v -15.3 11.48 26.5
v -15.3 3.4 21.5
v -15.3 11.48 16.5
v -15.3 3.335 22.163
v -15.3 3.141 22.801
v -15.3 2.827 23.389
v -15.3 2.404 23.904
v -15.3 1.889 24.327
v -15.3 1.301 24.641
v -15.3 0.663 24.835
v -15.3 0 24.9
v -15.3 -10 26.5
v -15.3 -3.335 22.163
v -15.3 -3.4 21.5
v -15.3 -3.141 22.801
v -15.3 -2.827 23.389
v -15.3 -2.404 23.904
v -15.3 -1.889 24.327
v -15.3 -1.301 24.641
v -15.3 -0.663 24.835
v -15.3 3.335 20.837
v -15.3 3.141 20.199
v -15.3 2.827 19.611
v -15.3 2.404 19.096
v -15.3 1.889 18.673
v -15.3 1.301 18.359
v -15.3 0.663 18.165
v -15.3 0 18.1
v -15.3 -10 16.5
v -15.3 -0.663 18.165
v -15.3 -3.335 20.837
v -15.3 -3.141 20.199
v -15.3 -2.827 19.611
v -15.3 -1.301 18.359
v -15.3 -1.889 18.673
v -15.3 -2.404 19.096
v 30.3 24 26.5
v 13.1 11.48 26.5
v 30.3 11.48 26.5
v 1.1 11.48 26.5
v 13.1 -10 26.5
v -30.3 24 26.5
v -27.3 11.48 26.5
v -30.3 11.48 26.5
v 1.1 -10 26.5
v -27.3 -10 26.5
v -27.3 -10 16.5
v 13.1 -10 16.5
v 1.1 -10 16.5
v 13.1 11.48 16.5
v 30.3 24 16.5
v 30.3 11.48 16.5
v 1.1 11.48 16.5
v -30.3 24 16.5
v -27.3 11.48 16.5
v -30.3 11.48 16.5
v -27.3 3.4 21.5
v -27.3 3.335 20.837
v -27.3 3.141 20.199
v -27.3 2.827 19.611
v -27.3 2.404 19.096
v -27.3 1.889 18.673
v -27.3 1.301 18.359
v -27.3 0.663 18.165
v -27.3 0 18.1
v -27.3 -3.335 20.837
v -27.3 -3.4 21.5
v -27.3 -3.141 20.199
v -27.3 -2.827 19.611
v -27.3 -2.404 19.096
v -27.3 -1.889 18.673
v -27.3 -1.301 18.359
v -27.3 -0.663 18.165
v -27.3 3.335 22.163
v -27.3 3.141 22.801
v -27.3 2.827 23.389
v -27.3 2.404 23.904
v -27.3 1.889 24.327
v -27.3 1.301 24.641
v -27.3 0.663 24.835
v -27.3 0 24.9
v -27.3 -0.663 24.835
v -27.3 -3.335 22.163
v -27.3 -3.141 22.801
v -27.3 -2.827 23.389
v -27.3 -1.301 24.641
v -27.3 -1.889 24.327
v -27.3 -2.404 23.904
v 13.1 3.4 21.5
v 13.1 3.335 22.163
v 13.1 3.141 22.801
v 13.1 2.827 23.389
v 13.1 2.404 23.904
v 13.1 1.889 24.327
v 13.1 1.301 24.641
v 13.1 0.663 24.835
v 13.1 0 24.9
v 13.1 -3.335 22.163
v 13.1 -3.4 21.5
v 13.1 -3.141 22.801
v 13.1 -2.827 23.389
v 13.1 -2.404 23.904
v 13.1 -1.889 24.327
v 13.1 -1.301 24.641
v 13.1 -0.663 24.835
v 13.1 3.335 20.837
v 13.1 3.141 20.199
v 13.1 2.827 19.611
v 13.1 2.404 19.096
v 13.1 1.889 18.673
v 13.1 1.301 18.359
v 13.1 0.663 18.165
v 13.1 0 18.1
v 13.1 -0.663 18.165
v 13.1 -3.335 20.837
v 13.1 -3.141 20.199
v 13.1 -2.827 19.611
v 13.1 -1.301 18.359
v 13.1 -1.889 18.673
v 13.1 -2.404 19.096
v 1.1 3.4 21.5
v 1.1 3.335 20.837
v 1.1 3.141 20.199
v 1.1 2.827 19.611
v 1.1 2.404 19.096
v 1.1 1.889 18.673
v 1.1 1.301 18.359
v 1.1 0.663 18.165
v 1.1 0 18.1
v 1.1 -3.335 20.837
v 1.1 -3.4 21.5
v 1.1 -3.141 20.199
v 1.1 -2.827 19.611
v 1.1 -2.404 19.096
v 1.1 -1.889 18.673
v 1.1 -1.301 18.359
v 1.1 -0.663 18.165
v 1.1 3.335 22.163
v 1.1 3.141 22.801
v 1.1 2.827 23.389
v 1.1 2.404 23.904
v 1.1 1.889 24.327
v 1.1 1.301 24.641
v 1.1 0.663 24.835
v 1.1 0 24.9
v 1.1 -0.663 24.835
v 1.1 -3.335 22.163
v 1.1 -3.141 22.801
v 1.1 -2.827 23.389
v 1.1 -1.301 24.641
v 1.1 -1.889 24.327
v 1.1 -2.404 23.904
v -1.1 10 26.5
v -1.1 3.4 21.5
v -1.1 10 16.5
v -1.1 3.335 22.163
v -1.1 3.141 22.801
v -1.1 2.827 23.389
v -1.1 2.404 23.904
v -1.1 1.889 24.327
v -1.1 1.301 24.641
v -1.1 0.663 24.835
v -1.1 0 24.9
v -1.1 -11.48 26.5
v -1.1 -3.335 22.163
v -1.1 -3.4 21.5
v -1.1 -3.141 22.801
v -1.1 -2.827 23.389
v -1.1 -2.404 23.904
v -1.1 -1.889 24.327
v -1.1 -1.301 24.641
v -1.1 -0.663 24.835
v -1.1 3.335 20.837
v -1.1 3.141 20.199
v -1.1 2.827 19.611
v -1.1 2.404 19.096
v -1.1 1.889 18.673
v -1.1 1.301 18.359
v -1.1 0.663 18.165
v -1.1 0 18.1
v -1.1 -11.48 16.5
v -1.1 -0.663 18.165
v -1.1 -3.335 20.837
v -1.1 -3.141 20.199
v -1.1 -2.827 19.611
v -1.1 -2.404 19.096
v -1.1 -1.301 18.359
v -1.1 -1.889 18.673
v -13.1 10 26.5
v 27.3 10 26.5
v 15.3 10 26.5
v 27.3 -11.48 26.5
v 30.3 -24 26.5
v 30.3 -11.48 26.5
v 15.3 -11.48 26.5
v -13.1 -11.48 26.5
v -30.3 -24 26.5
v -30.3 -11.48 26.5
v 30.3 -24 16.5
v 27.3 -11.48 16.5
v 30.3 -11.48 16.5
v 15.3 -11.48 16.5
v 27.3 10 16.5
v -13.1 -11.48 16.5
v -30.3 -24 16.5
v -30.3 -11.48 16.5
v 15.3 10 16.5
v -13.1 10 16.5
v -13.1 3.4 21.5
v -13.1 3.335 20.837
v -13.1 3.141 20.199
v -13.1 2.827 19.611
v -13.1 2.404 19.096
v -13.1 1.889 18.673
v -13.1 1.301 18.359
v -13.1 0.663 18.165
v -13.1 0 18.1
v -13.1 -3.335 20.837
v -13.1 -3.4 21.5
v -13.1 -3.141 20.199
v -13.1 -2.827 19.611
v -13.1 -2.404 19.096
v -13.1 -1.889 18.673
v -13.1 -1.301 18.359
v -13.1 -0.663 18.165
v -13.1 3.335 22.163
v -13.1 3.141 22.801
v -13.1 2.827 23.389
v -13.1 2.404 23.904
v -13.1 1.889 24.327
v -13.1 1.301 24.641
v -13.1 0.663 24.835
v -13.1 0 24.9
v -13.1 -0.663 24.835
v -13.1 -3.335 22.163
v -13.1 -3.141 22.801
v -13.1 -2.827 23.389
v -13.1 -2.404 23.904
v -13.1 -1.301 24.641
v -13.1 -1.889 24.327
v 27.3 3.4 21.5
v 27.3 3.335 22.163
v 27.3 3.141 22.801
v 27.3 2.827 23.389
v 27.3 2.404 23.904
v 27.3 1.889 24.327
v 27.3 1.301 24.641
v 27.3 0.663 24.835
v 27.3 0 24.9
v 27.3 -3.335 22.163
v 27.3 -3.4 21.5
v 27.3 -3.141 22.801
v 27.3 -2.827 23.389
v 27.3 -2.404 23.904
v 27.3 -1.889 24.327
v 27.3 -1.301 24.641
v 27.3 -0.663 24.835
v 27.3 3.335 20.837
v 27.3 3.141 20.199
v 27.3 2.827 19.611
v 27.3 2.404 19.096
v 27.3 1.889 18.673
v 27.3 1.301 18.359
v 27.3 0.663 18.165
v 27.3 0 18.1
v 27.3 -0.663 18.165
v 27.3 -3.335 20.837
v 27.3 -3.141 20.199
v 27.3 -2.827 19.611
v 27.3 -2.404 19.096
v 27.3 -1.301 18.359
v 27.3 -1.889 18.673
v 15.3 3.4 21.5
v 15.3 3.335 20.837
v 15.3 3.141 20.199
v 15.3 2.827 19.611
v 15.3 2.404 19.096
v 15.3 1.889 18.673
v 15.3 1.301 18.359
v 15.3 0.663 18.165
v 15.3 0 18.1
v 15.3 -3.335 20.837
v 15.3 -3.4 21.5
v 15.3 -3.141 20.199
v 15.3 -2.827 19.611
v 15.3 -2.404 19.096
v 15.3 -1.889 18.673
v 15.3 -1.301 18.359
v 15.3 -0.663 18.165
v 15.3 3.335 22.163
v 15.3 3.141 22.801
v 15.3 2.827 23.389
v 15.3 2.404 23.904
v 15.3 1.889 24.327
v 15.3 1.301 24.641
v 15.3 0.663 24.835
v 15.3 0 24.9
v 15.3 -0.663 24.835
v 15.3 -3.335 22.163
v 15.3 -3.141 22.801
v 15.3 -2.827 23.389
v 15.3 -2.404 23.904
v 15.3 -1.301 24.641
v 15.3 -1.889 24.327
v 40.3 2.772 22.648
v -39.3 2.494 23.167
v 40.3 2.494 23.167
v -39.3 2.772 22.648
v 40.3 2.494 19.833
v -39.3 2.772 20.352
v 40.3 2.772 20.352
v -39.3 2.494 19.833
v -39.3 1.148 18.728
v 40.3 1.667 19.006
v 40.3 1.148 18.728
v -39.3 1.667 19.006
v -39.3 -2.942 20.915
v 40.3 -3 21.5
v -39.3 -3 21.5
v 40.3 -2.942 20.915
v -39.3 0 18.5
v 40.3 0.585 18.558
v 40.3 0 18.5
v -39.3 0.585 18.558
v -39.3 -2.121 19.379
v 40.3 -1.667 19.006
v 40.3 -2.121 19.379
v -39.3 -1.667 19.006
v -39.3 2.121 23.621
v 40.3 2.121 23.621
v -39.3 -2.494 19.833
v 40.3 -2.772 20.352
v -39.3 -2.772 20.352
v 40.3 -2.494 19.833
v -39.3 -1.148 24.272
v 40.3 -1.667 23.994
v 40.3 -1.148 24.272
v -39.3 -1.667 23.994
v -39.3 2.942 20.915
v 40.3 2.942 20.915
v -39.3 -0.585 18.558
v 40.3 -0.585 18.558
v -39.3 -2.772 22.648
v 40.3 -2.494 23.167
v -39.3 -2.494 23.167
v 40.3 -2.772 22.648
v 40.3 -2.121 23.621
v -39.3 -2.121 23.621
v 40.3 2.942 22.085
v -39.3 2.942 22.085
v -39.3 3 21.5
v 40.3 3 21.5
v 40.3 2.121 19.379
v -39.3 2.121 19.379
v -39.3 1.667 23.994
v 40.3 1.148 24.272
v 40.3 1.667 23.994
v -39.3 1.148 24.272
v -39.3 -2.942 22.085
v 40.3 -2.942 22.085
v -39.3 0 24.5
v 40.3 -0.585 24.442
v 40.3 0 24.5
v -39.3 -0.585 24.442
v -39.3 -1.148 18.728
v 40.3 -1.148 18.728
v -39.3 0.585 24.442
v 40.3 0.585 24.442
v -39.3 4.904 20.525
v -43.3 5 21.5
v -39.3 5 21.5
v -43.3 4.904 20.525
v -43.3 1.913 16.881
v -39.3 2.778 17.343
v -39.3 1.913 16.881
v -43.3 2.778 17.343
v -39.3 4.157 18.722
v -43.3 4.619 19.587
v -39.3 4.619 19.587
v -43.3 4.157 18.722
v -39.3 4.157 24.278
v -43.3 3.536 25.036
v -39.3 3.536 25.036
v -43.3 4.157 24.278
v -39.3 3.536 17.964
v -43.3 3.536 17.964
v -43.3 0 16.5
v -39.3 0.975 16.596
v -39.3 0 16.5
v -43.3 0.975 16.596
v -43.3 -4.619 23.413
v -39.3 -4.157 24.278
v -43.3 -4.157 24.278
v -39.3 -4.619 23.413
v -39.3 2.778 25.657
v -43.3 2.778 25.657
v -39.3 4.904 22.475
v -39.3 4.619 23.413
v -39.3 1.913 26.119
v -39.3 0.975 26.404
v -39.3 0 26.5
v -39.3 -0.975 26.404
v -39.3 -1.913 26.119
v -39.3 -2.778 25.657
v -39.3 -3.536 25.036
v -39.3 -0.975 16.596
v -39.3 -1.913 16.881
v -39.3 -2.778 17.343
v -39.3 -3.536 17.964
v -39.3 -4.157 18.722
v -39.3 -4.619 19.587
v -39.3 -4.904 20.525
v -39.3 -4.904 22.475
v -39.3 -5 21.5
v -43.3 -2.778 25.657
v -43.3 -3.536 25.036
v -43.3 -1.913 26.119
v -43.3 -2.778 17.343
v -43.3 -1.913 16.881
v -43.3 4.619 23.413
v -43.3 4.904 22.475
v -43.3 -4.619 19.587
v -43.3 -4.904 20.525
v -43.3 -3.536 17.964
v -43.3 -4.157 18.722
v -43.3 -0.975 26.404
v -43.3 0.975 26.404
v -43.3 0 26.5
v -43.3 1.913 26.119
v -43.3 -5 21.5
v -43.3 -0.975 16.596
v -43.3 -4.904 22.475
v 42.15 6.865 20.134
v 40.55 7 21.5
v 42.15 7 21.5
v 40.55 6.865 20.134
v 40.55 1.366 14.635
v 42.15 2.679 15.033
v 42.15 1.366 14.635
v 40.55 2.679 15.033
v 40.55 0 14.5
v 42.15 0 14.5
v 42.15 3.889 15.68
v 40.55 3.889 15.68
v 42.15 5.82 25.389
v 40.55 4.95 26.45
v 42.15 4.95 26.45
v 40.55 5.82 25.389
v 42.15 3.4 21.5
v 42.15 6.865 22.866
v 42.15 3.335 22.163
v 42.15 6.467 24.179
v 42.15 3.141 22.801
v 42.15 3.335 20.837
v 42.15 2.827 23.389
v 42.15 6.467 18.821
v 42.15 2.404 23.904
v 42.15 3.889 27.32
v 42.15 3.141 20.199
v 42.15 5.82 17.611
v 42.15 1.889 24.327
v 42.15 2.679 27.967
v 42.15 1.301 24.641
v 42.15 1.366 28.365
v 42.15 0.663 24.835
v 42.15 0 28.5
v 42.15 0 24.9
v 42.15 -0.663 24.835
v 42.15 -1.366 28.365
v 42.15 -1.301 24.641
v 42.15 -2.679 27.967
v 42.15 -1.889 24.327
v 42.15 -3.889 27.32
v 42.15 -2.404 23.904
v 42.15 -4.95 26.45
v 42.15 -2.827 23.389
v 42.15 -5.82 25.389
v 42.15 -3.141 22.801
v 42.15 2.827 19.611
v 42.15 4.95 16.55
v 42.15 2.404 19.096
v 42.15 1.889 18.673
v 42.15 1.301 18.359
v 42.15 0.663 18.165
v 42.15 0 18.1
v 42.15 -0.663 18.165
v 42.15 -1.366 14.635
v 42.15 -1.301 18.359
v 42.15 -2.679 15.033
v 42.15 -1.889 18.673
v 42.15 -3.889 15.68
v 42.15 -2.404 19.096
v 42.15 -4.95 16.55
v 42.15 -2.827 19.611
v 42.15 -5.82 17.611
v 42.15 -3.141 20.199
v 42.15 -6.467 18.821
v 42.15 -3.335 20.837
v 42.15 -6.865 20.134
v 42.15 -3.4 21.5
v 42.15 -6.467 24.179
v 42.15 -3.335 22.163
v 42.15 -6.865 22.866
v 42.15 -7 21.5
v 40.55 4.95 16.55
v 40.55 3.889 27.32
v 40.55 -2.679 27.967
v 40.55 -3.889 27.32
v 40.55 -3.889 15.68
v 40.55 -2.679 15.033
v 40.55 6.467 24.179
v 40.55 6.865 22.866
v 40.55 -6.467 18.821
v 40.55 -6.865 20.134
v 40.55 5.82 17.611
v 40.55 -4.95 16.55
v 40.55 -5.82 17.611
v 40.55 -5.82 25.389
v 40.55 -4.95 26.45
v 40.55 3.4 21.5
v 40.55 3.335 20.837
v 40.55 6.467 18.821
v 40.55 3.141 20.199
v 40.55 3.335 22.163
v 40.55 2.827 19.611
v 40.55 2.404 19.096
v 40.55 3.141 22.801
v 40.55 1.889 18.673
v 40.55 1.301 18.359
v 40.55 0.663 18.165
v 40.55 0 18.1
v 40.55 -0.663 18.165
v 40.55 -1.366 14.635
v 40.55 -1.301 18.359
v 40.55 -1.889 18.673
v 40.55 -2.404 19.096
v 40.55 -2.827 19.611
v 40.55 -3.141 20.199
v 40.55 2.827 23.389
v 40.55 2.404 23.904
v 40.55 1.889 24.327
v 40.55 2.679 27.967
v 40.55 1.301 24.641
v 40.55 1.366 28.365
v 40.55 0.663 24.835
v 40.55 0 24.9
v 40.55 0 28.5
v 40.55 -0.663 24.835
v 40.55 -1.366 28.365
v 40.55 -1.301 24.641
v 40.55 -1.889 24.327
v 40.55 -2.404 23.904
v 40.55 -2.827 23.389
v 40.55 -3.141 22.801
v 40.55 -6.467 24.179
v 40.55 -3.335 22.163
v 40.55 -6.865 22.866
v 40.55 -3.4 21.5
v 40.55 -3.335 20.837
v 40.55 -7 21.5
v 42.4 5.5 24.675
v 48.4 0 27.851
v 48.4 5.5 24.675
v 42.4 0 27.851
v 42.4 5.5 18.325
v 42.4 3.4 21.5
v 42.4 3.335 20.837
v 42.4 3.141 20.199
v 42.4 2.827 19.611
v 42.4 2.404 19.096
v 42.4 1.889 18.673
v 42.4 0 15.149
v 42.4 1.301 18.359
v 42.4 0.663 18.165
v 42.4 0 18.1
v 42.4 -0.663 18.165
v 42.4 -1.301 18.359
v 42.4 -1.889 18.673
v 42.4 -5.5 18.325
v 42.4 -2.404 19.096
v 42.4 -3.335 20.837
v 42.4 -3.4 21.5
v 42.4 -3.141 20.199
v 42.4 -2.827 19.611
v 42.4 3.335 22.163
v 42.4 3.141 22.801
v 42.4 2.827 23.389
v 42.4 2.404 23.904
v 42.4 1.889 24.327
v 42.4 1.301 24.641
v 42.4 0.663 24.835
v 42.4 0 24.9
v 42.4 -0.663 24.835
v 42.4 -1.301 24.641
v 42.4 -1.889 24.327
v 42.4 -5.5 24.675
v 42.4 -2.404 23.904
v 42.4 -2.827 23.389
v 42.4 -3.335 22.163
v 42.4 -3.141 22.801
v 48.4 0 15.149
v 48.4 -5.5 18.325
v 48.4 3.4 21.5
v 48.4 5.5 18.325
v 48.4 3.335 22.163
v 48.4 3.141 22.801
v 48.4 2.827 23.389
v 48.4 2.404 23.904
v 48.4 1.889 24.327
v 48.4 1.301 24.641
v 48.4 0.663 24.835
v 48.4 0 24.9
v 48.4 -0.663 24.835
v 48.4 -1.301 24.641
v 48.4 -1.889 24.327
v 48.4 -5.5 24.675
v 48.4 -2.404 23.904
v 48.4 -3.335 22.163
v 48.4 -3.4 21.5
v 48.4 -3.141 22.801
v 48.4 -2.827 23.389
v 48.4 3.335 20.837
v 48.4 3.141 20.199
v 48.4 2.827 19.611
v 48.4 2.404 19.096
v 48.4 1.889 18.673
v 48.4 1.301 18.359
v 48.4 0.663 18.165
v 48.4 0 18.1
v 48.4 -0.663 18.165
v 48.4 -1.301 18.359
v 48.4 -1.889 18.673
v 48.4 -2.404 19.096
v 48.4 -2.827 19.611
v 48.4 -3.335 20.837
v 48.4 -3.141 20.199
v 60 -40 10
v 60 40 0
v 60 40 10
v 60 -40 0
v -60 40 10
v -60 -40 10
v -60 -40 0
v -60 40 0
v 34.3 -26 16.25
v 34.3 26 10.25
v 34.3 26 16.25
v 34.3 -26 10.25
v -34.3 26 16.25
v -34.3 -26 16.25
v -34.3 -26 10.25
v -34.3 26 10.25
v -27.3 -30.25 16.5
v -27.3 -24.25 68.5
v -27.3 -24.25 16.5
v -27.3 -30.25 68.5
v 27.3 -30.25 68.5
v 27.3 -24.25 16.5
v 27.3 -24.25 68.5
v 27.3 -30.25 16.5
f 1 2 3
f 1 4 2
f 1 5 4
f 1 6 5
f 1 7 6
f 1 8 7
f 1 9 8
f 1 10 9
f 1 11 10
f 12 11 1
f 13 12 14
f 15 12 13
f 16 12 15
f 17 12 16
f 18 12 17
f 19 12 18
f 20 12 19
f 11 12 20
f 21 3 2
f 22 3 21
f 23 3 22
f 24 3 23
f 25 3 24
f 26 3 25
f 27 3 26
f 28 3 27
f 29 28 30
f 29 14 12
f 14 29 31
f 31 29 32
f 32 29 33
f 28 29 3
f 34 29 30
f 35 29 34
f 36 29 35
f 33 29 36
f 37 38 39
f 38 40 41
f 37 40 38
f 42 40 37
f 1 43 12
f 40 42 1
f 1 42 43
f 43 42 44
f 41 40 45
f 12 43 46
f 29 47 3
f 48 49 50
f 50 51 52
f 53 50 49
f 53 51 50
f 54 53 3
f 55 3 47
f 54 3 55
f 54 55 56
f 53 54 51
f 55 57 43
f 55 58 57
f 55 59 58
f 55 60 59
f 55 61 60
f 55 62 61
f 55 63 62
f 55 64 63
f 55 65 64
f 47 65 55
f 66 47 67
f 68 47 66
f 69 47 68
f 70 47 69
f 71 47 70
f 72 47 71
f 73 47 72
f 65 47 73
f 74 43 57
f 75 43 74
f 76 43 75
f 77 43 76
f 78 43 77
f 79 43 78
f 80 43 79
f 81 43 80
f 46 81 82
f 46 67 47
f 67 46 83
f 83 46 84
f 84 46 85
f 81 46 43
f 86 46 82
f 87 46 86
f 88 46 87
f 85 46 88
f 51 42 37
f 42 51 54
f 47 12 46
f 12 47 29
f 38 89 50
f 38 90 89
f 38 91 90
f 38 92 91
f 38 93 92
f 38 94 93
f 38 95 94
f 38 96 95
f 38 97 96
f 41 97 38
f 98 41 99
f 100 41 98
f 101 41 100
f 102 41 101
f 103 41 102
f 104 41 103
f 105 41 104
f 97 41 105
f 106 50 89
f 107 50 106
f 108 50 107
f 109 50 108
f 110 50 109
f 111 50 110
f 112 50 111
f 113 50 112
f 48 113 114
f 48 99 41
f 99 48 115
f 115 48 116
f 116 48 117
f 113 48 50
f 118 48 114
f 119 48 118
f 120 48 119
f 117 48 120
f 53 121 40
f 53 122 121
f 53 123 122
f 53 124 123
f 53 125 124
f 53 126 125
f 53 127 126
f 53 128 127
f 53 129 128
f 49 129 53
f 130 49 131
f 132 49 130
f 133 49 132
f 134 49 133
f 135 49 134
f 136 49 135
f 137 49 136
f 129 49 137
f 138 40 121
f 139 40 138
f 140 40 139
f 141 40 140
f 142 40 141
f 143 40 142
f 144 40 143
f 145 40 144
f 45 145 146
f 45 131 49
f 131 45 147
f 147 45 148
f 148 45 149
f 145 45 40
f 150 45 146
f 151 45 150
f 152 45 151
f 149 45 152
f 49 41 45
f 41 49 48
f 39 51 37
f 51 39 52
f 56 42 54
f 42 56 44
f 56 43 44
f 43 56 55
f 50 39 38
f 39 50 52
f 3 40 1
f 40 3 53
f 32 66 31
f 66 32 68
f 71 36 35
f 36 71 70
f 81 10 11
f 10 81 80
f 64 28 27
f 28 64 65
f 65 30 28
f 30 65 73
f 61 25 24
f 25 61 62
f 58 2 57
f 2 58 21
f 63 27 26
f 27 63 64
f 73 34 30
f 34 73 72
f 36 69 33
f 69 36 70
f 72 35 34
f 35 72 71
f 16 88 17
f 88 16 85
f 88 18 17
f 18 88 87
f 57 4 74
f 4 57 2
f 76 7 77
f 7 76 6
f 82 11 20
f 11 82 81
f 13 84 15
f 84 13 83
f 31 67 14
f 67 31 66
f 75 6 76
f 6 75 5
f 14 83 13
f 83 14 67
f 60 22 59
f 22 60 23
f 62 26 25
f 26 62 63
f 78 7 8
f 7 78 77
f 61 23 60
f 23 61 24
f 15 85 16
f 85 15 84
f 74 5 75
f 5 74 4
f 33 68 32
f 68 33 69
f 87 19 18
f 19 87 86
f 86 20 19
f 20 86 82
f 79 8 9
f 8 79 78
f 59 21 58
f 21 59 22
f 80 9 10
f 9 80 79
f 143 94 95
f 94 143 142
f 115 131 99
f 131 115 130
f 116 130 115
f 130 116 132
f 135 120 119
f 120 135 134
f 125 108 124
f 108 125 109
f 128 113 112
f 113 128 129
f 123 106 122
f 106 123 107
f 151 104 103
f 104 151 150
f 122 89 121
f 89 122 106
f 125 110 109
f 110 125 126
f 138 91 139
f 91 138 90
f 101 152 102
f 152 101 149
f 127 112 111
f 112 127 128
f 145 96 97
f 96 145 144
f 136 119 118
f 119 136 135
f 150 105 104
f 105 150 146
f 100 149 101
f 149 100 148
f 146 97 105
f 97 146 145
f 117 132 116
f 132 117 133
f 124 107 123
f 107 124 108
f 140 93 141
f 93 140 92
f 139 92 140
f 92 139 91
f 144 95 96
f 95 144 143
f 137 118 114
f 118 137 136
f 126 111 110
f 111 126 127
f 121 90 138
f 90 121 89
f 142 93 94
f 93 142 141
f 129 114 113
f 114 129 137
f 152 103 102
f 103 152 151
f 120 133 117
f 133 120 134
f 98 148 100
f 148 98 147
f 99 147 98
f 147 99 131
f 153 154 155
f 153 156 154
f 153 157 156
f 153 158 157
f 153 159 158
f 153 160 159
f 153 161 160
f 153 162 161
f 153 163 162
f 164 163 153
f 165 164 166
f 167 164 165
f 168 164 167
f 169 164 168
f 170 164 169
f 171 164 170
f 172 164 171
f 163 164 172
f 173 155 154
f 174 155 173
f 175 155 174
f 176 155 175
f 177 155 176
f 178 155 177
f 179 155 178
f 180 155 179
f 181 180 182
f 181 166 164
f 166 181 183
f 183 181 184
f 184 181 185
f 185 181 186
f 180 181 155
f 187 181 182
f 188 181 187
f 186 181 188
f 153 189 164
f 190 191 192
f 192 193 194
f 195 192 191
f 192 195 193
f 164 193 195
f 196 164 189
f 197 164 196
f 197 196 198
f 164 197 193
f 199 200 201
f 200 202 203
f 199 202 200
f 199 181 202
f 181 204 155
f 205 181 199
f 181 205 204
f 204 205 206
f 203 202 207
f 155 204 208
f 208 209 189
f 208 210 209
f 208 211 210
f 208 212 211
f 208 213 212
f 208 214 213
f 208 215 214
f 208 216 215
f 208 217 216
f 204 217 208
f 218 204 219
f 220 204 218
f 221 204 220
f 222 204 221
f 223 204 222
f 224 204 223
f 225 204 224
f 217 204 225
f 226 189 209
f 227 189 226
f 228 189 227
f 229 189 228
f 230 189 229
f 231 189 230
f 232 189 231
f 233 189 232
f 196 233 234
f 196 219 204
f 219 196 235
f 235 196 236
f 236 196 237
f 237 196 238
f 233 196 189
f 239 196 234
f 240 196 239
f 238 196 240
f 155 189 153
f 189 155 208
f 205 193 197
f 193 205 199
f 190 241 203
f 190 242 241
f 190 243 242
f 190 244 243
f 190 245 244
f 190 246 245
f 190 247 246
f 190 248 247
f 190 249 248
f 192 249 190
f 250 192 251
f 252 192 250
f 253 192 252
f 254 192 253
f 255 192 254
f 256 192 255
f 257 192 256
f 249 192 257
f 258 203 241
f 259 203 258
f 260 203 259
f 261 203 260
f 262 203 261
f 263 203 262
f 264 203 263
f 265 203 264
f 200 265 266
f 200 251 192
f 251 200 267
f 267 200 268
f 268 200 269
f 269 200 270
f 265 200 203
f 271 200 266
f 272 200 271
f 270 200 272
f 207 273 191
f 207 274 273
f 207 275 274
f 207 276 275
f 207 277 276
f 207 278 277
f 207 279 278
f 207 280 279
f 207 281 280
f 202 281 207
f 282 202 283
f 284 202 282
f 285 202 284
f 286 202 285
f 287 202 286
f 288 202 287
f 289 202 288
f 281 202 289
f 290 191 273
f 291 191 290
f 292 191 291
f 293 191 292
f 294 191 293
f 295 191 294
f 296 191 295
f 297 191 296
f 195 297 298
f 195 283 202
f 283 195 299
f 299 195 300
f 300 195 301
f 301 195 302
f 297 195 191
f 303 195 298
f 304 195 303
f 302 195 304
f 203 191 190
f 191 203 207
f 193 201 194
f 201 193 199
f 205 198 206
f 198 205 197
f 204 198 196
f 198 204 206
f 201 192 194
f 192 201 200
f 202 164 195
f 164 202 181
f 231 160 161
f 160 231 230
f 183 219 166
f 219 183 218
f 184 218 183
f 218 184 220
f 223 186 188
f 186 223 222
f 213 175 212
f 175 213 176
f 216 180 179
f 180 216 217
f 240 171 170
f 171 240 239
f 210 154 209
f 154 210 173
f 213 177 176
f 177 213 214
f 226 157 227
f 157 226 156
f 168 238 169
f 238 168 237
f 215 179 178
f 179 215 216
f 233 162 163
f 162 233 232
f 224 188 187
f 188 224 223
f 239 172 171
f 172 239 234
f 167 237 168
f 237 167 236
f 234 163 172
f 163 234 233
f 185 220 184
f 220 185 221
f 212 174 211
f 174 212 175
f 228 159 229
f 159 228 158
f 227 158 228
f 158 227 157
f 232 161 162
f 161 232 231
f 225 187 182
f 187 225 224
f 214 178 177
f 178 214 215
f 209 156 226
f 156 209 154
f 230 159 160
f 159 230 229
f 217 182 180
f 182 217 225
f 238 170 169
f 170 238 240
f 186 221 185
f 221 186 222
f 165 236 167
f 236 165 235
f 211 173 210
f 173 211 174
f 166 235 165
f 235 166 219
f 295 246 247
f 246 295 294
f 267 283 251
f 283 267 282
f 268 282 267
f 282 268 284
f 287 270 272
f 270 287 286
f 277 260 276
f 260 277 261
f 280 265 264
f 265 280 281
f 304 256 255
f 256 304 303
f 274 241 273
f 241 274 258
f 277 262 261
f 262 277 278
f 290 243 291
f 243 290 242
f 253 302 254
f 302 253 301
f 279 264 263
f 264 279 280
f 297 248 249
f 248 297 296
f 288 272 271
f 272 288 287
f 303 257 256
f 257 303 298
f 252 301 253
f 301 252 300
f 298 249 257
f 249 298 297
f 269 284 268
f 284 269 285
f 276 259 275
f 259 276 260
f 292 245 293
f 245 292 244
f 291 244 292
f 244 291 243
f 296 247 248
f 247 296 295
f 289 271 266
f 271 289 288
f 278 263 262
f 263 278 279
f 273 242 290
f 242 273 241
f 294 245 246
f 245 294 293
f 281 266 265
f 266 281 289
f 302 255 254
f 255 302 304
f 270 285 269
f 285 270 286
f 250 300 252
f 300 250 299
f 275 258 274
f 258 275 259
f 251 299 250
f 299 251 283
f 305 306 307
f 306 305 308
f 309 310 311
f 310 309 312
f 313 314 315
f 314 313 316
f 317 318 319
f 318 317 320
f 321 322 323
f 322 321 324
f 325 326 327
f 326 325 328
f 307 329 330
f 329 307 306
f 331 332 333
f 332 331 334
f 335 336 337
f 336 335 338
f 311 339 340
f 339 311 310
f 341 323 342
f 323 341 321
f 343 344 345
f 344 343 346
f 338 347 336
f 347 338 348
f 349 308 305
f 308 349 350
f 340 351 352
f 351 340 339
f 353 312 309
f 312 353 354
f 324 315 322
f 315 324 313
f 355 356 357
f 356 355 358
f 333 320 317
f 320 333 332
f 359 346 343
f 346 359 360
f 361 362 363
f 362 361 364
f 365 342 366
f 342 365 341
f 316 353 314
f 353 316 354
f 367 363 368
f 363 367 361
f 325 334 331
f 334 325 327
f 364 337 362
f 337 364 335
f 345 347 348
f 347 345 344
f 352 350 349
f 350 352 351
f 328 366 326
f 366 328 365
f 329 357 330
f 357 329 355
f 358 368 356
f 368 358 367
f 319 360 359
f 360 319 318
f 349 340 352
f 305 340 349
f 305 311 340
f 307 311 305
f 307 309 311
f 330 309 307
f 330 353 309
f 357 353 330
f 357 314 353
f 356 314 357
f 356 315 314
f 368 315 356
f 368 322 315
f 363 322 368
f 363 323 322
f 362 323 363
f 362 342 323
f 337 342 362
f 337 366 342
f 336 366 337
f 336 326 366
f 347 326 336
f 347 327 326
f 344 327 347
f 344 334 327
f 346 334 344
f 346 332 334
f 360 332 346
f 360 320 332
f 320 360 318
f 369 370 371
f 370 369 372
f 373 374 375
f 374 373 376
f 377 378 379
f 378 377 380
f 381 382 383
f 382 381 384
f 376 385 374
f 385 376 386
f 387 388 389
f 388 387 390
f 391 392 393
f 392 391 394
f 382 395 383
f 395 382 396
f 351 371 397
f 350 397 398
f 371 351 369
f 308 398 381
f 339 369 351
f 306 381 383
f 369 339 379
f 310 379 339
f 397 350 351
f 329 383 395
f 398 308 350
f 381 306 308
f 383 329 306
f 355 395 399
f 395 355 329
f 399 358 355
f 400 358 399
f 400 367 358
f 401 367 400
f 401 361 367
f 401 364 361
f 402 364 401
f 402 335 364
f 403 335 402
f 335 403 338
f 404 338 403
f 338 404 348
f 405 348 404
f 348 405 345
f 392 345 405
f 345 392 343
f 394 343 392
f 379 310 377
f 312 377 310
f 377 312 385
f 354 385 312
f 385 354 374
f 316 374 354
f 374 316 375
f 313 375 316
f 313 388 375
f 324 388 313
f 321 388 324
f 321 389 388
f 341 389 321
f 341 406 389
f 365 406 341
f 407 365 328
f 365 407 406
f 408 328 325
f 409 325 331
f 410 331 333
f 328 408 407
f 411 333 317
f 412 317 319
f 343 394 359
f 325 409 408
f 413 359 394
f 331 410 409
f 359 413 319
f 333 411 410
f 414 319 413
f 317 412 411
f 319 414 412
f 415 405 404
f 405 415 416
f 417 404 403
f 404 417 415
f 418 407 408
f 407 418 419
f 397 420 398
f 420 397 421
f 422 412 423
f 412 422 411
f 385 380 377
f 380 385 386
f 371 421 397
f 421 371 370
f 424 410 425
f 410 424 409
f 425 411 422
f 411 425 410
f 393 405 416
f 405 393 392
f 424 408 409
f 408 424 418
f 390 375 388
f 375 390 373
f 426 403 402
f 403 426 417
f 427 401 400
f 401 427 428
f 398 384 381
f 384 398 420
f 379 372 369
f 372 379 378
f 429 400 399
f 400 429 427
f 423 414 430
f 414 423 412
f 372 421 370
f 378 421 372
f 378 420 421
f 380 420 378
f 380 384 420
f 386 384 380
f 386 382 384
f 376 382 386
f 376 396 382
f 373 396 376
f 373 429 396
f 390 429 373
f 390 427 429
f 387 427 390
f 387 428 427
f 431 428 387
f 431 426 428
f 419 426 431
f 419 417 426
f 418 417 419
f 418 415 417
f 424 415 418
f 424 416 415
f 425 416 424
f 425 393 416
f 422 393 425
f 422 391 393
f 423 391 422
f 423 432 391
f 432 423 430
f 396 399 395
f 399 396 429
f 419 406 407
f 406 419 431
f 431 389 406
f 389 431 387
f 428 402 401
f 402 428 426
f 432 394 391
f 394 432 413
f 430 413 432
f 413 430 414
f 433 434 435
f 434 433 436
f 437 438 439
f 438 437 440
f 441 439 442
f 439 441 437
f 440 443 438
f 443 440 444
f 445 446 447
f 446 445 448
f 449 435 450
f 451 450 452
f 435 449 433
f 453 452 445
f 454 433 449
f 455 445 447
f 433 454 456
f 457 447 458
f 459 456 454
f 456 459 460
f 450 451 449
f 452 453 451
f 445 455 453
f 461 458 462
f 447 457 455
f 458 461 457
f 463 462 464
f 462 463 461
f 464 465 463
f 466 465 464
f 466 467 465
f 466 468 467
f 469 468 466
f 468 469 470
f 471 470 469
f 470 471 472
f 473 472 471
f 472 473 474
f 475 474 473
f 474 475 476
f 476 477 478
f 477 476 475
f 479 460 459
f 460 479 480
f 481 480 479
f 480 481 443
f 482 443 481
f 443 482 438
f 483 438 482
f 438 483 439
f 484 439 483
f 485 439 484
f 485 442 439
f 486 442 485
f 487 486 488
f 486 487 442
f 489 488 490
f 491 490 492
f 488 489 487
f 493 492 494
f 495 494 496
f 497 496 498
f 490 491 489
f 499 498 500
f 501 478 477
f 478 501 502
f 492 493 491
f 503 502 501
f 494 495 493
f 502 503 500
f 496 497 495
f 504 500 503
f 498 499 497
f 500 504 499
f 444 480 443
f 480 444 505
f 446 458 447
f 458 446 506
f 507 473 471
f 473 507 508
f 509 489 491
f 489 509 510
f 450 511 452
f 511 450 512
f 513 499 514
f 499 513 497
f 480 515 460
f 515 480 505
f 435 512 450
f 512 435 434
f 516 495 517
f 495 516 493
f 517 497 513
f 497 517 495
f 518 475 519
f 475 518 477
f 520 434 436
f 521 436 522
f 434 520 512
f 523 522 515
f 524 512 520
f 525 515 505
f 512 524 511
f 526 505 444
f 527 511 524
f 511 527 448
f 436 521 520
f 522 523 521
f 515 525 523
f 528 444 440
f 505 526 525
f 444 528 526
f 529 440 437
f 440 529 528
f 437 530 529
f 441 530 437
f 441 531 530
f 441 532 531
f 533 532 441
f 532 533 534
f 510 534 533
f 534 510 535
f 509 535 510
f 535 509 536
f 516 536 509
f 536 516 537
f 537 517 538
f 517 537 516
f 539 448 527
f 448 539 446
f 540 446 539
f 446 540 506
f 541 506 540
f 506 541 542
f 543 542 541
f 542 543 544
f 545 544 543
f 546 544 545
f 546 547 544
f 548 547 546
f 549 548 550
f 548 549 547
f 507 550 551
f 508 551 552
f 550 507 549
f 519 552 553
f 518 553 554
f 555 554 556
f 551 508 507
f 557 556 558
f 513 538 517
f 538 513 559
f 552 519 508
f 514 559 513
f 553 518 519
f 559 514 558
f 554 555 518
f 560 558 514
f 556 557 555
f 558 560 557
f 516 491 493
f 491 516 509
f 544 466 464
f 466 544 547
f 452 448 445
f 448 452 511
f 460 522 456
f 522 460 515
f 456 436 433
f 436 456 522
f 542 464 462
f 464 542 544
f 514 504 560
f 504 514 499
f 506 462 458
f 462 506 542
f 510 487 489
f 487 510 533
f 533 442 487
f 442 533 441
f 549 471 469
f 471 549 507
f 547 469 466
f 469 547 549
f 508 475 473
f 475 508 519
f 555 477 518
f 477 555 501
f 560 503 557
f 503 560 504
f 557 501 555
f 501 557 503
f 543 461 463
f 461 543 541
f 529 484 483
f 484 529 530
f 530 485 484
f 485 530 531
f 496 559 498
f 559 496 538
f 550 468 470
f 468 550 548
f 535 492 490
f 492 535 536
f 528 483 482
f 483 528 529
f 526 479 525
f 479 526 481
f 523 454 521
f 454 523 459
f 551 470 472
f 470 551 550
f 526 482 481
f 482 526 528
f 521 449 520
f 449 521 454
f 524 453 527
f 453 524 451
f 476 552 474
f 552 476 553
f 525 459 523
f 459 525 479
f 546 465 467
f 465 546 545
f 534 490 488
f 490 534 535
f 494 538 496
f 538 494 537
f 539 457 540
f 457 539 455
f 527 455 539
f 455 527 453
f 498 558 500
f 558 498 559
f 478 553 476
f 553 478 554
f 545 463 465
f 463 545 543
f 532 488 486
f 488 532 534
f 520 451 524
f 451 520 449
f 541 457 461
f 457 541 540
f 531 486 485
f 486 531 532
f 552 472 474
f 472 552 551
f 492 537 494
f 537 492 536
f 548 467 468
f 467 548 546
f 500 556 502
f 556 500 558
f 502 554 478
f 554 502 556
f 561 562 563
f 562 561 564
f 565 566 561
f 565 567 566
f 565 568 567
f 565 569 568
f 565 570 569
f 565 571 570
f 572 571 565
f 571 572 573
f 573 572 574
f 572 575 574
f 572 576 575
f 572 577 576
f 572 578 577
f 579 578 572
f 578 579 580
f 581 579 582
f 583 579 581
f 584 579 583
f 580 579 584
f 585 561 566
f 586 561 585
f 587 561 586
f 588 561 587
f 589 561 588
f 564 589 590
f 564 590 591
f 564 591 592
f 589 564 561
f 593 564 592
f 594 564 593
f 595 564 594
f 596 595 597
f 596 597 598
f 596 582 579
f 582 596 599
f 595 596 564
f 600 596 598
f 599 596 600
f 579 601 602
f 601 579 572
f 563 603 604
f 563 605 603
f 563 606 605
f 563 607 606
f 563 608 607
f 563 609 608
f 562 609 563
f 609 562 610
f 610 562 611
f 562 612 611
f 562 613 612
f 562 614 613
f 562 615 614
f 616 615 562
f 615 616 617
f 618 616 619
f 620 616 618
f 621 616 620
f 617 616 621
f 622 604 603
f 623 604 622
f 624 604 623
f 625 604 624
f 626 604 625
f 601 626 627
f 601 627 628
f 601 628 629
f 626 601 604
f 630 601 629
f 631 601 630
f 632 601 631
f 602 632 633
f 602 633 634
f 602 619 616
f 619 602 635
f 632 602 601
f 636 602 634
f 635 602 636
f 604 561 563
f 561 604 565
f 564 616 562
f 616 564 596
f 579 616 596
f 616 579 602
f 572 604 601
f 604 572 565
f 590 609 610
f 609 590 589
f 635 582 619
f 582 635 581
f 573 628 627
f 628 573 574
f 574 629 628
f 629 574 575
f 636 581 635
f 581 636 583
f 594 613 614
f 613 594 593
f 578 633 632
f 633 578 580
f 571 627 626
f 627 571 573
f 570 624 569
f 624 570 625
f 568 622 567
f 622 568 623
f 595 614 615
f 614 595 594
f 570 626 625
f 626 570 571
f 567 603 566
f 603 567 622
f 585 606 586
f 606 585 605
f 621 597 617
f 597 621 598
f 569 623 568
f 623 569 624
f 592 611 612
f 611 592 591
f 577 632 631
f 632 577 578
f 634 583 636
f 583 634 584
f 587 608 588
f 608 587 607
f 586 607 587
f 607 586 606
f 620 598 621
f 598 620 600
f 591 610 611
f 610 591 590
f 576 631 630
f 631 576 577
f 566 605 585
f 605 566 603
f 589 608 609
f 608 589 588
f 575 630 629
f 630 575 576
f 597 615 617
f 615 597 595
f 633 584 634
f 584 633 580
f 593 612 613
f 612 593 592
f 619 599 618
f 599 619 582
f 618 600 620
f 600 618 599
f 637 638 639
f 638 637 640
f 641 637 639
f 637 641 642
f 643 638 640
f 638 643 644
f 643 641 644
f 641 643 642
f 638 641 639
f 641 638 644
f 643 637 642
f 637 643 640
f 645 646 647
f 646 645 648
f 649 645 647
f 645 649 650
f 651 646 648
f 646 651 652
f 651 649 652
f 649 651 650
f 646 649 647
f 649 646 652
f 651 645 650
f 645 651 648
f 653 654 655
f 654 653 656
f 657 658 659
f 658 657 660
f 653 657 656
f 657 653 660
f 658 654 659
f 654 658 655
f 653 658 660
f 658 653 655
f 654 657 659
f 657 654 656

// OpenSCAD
$fn = 32;

// ------------------------------------------------------------------------
// Comb hinge with flap: leaf 60.6 x 24 mm, pin d6, flap 52 mm
// Every part is its own module, assembly() places every instance.
// ------------------------------------------------------------------------

// --- part 1 ---
module hinge_bed() {
  difference() {
    translate([-60, -40, 0]) cube([120, 80, 10]);
  }
}

// --- part 2 ---
module hinge_riser() {
  difference() {
    translate([-34.3, -26, 0]) cube([68.6, 52, 6]);
  }
}

// --- part 3 ---
module hinge_leaf_a() {
  difference() {
    union() {
      translate([-27.3, -10, -5]) cube([12, 34, 10]);
      translate([1.1, -10, -5]) cube([12, 34, 10]);
      translate([-30.3, 11.48, -5]) cube([60.6, 12.52, 10]);
    }
    translate([-21.3, 0, 0]) rotate([0, 90, 0]) cylinder(h = 14, d = 6.8, center = true);
    translate([7.1, 0, 0]) rotate([0, 90, 0]) cylinder(h = 14, d = 6.8, center = true);
  }
}

// --- part 4 ---
module hinge_leaf_b() {
  difference() {
    union() {
      translate([-13.1, -24, -5]) cube([12, 34, 10]);
      translate([15.3, -24, -5]) cube([12, 34, 10]);
      translate([-30.3, -24, -5]) cube([60.6, 12.52, 10]);
    }
    translate([-7.1, 0, 0]) rotate([0, 90, 0]) cylinder(h = 14, d = 6.8, center = true);
    translate([21.3, 0, 0]) rotate([0, 90, 0]) cylinder(h = 14, d = 6.8, center = true);
  }
}

// --- part 5 ---
module hinge_flap() {
  difference() {
    translate([-27.3, -26, 0]) cube([54.6, 52, 6]);
  }
}

// --- part 6 ---
module hinge_pin() {
  rotate([0, 90, 0]) cylinder(h = 80.6, d = 6, center = true);
  translate([-43.3, 0, 0]) rotate([0, 90, 0]) cylinder(h = 4, d = 10);
}

// --- part 7 ---
module pin_washer() {
  difference() {
      translate([0, 0, 0]) cylinder(h = 1.6, d = 14);
      translate([0, 0, -1]) cylinder(h = 3.6, d = 6.8);
    }
}

// --- part 8 ---
module pin_nut() {
  difference() {
    linear_extrude(height = 6) polygon(points = [[6.351, 0], [3.175, 5.5], [-3.175, 5.5], [-6.351, 0], [-3.175, -5.5], [3.175, -5.5]]);
    translate([0, 0, -1]) cylinder(h = 8, d = 6.8);
  }
}

// --- assembly ---
module assembly() {
  color([0.80, 0.24, 0.20]) translate([0, 0, 0]) rotate([0, 0, 0]) hinge_bed();
  color([0.20, 0.45, 0.75]) translate([0, 0, 10.25]) rotate([0, 0, 0]) hinge_riser();
  color([0.25, 0.62, 0.32]) translate([0, 0, 21.5]) rotate([0, 0, 0]) hinge_leaf_a();
  color([0.92, 0.70, 0.18]) translate([0, 0, 21.5]) rotate([0, 0, 0]) hinge_leaf_b();
  color([0.58, 0.35, 0.70]) translate([0, -24.25, 42.5]) rotate([90, 0, 0]) hinge_flap();
  color([0.16, 0.66, 0.66]) translate([0, 0, 21.5]) rotate([0, 0, 0]) hinge_pin();
  color([0.85, 0.48, 0.18]) translate([40.55, 0, 21.5]) rotate([0, 90, 0]) pin_washer();
  color([0.55, 0.60, 0.65]) translate([42.4, 0, 21.5]) rotate([0, 90, 0]) pin_nut();
}

assembly();
